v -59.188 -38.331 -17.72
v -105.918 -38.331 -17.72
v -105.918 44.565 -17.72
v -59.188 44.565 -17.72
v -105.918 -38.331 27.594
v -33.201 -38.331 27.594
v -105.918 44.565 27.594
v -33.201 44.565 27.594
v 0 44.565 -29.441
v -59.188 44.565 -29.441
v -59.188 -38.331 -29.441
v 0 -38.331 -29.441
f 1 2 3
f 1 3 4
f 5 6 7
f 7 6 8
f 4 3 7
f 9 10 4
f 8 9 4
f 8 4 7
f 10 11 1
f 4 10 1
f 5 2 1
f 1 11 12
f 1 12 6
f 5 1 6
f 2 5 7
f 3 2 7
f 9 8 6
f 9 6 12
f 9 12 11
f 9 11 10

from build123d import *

# Parameters (mm, degrees)
F0_W     = 82.8963629901
F0_H     = 57.0345446467
F1_DEPTH = 105.918
F3_DEPTH = 82.8973629901
F4_W     = 46.730304616
F4_H     = 11.7213707417
F5_DEPTH = 82.8973629901


with BuildPart() as f1:
    # F0 (on Right) → F1 (new body)
    with BuildSketch(Plane.YZ):
        with Locations((3.1172726303, -0.9236373007)):
            Rectangle(F0_W, F0_H)
    extrude(amount=-F1_DEPTH)

    # F2 (on face) → F3 (cut, through all)
    with BuildSketch(Plane.XZ.offset(38.3309088647)):
        Polygon((0, 27.5936350226), (-33.2005023956, 27.5936350226), (0, -29.4409096241), align=None)
    extrude(amount=-F3_DEPTH, mode=Mode.SUBTRACT)

    # F4 (on face) → F5 (cut, through all)
    with BuildSketch(Plane.XZ.offset(38.3309088647)):
        with Locations((-82.552847692, -23.5802242532)):
            Rectangle(F4_W, F4_H)
    extrude(amount=-F5_DEPTH, mode=Mode.SUBTRACT)


solid = f1.part
